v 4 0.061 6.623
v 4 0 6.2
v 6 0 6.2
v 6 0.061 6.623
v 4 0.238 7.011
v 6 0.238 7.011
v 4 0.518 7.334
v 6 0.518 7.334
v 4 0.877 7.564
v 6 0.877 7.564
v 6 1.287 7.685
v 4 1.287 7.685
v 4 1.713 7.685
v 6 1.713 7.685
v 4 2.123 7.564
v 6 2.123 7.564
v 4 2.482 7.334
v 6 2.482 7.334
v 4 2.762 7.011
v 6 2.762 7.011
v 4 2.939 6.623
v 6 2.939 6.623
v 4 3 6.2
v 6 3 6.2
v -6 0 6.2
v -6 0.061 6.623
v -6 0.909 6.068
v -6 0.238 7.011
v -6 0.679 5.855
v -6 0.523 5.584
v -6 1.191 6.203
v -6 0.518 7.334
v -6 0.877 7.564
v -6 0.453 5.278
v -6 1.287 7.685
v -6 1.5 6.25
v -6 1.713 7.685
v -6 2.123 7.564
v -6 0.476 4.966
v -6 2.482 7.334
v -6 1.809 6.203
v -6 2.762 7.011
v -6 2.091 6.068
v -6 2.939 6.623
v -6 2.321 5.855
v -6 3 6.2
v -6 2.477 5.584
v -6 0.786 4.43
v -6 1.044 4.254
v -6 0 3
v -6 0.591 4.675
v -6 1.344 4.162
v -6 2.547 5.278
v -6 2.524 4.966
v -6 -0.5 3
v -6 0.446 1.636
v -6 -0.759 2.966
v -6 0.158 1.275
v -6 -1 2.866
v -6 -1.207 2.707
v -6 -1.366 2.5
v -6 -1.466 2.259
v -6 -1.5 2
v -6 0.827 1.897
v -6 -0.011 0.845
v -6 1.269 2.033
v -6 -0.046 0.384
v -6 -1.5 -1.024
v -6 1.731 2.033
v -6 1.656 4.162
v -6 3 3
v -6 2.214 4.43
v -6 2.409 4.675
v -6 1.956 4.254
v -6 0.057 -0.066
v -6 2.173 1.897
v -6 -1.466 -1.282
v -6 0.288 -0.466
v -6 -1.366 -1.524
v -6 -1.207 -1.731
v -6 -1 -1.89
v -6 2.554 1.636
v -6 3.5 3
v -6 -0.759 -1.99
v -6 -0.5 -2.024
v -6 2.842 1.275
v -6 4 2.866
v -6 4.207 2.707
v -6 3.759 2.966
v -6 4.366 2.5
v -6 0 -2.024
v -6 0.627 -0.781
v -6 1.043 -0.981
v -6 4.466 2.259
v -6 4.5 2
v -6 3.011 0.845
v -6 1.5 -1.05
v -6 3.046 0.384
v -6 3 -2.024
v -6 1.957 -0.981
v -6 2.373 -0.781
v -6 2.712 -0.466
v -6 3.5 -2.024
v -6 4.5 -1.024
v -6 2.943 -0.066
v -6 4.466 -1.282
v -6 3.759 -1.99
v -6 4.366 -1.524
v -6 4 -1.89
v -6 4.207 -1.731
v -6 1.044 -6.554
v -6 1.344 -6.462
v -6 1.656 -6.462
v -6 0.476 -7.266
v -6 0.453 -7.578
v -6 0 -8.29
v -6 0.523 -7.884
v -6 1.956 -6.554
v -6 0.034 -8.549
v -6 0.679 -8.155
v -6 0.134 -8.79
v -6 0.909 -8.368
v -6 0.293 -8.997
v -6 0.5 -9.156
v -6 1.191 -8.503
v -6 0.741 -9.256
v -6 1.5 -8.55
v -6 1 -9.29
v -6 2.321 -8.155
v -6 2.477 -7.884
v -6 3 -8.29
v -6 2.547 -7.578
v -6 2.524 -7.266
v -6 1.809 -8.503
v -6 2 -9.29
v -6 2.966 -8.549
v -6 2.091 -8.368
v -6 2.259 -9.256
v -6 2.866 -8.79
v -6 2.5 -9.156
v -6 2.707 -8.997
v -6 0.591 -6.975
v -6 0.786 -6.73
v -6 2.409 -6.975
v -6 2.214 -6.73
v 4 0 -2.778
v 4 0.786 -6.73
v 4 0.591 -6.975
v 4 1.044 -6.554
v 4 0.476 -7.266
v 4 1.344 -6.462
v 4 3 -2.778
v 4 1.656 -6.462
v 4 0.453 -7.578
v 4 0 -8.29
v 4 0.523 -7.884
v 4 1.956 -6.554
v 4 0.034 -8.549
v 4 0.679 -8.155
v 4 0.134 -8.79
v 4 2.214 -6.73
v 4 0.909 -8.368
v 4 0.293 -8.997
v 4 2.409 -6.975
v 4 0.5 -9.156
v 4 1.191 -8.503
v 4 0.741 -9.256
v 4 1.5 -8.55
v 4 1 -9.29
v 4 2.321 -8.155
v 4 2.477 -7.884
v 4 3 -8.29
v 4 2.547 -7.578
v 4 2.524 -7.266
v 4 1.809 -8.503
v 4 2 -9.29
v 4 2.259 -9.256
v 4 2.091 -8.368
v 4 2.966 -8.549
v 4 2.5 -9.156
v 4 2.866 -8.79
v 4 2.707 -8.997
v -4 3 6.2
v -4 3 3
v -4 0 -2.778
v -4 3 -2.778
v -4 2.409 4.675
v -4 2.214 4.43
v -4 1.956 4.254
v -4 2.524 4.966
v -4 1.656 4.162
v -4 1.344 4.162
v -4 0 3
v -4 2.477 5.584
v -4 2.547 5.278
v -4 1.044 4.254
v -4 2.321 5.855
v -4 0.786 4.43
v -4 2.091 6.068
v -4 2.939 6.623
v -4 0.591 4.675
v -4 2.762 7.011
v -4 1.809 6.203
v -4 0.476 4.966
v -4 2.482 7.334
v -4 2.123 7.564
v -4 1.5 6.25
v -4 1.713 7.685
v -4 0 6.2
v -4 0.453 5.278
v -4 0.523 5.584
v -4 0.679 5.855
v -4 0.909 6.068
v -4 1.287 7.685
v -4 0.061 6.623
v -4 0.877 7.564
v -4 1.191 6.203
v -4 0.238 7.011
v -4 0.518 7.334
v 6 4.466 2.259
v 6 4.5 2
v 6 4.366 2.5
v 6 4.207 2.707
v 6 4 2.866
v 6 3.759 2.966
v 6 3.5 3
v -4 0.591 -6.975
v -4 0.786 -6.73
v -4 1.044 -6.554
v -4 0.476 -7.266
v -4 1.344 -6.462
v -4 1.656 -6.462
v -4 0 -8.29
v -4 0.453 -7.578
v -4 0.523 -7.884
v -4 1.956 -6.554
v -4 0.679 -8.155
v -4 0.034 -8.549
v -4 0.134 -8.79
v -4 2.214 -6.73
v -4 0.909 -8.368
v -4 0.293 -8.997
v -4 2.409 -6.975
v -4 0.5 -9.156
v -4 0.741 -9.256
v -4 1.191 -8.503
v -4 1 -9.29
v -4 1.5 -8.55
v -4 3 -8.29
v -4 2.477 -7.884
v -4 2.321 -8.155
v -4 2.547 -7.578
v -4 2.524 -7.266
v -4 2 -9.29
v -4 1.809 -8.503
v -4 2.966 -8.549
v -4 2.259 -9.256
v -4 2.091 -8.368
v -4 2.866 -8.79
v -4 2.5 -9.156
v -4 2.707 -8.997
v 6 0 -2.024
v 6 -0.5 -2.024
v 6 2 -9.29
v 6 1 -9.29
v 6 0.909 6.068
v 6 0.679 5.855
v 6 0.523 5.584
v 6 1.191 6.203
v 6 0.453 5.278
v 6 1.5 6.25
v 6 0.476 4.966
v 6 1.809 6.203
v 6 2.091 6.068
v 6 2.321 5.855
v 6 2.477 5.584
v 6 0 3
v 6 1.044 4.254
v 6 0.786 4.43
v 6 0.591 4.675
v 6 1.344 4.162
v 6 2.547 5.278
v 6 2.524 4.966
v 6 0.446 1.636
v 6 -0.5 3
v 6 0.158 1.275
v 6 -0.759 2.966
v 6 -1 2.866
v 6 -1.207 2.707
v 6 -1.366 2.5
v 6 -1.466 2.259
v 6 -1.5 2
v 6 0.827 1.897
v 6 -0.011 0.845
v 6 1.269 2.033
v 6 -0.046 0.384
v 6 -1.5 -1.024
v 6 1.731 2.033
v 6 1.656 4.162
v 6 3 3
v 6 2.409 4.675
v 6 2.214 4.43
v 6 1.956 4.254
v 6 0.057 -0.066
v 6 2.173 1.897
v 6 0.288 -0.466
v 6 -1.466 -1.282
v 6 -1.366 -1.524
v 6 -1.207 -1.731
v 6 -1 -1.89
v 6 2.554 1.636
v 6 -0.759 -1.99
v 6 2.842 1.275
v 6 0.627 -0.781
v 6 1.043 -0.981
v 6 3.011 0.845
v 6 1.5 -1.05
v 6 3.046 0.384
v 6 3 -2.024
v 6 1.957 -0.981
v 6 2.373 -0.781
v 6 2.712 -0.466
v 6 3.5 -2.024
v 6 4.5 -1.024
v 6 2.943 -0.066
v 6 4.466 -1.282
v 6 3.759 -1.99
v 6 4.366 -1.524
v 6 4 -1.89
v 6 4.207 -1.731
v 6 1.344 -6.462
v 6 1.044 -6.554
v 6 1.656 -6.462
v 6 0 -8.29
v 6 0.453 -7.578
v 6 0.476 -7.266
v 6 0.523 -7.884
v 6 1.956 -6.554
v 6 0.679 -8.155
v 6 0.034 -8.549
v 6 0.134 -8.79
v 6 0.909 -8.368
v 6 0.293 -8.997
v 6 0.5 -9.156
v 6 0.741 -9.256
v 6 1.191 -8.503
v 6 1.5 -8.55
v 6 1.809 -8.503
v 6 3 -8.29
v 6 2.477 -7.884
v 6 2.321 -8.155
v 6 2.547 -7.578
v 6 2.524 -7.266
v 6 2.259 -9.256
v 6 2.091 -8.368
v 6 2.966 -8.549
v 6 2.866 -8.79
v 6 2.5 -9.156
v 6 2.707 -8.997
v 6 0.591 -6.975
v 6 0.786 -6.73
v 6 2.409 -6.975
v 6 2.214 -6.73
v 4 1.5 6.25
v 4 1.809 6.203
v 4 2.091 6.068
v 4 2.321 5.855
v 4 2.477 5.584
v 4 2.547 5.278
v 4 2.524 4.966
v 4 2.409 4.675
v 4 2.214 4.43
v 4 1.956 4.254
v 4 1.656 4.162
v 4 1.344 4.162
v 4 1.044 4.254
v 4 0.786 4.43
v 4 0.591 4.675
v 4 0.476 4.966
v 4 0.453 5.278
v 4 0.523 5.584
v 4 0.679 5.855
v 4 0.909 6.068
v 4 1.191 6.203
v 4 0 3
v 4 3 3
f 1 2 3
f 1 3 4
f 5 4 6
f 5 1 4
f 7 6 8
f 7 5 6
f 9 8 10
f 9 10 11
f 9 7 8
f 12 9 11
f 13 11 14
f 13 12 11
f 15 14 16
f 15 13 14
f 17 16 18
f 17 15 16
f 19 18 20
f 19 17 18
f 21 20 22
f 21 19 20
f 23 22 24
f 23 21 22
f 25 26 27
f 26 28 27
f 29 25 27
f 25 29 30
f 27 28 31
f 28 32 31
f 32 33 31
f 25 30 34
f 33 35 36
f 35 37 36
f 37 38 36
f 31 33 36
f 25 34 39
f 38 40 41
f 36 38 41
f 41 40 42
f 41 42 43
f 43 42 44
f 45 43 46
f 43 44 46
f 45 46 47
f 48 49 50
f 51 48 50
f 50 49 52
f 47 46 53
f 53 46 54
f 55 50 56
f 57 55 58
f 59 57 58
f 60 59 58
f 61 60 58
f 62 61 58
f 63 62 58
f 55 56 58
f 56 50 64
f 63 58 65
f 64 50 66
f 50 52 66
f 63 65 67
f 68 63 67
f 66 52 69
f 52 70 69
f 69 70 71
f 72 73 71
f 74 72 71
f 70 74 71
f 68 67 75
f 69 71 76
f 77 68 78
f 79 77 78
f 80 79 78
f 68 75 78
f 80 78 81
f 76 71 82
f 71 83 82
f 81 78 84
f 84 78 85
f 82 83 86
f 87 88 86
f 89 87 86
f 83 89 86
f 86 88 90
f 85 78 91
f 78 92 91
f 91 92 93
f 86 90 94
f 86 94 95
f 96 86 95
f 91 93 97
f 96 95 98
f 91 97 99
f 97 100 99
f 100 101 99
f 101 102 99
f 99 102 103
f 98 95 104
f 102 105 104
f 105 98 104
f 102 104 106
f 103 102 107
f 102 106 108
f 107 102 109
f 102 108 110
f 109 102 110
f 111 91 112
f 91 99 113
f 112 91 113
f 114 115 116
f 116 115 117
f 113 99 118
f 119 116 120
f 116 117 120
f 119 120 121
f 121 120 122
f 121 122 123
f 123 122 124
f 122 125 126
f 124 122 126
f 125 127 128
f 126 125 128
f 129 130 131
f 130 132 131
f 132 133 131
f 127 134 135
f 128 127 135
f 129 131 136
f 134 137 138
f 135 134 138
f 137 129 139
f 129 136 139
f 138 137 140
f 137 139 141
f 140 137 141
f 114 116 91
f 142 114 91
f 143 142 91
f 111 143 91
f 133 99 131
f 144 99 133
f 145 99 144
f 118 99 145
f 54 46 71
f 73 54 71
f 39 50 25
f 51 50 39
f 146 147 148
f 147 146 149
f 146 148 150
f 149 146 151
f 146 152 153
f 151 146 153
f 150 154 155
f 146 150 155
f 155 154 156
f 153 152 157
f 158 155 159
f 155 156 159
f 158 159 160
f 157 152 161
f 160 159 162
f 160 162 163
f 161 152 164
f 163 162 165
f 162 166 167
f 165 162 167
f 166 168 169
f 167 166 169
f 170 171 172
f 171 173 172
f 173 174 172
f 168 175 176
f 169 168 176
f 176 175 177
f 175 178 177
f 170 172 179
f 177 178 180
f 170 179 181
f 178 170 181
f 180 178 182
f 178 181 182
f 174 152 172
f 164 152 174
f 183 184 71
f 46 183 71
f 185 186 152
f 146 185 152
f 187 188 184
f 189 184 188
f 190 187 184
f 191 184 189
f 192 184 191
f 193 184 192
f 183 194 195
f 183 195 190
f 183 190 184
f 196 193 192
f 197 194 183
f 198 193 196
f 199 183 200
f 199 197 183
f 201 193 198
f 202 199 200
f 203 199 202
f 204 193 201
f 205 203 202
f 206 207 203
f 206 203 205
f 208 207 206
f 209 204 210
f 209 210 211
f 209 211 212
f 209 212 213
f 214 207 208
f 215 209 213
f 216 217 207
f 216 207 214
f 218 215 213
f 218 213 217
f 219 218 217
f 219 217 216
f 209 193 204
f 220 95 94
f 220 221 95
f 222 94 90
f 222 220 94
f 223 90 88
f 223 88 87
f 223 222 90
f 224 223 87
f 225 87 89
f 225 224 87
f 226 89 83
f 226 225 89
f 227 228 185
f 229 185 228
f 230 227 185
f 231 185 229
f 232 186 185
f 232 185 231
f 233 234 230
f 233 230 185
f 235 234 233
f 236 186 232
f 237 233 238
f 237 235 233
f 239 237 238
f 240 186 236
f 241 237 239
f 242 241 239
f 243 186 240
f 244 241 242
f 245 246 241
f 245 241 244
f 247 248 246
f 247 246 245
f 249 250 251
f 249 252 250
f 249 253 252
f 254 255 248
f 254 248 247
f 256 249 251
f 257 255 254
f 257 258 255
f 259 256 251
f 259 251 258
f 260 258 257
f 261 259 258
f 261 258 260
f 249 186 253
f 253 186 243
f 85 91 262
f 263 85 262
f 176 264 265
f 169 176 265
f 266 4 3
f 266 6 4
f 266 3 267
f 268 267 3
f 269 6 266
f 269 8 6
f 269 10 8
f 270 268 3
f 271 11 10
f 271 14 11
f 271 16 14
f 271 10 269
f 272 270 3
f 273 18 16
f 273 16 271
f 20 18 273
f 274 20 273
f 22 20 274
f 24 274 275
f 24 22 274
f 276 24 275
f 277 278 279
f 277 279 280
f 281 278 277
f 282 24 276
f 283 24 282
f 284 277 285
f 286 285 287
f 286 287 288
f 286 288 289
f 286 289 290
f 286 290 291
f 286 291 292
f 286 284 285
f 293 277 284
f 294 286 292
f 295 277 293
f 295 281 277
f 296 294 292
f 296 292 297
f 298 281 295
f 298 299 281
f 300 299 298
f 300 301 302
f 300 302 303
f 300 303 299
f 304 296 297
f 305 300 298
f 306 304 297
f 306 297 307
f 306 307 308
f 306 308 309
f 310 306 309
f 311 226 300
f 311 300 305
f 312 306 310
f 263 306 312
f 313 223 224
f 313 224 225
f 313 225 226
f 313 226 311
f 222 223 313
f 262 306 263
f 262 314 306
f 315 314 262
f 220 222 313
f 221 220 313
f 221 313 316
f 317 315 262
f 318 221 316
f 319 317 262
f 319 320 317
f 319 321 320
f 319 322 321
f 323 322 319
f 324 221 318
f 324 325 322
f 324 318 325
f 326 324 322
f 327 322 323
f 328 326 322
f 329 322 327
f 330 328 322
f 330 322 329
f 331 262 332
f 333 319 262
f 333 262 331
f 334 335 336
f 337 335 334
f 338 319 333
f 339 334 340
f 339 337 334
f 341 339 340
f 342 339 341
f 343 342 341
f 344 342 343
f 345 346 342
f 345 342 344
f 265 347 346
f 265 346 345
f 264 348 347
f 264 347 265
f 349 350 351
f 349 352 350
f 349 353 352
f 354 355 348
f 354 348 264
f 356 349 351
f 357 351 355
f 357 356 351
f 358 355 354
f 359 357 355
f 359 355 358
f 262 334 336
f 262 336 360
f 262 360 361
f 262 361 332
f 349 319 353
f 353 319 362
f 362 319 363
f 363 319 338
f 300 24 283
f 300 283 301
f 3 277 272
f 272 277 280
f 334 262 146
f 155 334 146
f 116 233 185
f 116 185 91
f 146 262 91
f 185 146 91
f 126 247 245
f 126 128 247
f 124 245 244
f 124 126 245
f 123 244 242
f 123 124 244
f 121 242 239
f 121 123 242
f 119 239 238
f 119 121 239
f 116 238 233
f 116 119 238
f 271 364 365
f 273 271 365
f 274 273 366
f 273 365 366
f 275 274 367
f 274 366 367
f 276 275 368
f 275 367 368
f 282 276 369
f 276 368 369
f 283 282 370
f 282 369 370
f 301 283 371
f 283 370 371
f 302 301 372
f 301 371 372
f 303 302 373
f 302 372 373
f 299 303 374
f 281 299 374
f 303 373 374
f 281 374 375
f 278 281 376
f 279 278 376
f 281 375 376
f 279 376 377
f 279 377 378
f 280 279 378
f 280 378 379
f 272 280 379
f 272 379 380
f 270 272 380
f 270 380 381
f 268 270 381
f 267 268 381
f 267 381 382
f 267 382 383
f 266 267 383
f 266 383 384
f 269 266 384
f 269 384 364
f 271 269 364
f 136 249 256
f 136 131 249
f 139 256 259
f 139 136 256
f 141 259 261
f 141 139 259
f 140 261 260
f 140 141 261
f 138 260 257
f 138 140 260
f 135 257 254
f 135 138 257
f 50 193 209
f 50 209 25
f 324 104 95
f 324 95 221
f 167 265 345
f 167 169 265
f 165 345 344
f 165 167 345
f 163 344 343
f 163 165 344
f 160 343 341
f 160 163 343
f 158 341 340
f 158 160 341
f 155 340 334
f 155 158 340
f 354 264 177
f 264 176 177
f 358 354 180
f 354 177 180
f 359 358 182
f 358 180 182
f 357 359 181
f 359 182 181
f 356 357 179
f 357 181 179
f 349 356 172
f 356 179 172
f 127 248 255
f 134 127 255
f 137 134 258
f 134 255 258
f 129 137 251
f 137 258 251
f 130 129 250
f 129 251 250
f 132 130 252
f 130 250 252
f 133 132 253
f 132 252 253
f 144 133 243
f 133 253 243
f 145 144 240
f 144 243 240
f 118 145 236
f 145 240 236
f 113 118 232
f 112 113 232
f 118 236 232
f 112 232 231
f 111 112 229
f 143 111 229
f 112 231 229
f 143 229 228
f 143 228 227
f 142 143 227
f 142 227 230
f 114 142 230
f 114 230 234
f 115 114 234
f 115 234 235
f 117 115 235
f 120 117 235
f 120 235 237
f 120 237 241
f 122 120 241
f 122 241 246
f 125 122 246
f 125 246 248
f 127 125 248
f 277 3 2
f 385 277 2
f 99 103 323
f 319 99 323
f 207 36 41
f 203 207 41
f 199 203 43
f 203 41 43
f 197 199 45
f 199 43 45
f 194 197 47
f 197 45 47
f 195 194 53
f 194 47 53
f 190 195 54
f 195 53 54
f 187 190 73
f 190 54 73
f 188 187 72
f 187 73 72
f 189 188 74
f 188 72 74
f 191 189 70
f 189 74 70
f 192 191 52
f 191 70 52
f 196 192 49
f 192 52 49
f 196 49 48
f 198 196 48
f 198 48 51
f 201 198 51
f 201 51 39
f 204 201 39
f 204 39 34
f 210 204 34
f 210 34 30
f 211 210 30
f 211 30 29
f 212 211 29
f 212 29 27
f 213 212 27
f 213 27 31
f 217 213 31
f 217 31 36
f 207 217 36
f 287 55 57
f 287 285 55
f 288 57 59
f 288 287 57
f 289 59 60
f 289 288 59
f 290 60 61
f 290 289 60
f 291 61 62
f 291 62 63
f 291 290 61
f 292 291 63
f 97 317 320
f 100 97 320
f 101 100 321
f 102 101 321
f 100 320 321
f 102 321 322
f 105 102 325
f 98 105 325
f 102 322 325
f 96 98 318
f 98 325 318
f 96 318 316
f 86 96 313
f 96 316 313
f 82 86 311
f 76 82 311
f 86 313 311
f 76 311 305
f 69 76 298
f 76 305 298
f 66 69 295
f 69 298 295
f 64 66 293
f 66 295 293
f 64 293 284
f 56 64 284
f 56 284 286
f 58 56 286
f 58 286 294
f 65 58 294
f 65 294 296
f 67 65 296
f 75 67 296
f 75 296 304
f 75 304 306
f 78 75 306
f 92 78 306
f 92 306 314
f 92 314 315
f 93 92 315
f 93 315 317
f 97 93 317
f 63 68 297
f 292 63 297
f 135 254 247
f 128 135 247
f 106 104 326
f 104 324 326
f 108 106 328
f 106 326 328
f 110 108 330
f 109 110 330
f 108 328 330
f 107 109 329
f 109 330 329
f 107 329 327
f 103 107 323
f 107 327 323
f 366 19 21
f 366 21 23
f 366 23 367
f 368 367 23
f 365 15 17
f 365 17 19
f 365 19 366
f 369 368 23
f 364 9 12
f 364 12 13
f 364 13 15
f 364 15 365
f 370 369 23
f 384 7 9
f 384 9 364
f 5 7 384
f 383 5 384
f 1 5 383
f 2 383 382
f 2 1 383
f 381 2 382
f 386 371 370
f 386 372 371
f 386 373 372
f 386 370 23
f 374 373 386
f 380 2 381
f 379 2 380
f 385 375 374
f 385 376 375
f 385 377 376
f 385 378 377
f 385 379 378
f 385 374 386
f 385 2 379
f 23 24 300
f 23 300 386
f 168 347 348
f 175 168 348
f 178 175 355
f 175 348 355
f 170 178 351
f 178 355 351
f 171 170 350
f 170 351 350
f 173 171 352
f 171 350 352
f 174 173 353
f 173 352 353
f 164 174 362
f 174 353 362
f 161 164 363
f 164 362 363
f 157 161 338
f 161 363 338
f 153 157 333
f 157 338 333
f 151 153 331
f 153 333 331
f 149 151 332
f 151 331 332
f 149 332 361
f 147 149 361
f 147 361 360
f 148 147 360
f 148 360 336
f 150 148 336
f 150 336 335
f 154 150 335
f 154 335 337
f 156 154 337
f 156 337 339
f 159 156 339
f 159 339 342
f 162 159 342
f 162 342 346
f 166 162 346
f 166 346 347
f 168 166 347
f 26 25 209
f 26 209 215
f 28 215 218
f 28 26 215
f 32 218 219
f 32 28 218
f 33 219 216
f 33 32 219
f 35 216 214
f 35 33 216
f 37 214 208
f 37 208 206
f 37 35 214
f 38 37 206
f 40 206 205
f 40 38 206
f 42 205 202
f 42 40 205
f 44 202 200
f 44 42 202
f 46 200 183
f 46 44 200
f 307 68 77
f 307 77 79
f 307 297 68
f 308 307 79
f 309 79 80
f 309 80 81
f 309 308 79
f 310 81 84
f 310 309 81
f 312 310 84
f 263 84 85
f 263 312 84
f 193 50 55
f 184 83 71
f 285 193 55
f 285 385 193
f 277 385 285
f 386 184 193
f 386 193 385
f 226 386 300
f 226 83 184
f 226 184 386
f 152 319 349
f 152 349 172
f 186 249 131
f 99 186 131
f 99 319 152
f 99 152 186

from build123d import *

# Parameters (mm, degrees)
EXTRUDE_1_DEPTH          = 3
SKETCH_2_OUTSIDE_W       = 13.724
SKETCH_2_OUTSIDE_H       = 8.024
CUT_EXTRUDE_1_DEPTH      = 12
SKETCH_3_R               = 1.05
CUT_EXTRUDE_2_DEPTH      = 12
SKETCH_4_R               = 0.95
EXTRUDE_2_DEPTH          = 4
EXTRUDE_3_DEPTH          = 8
SKETCH_6_R               = 1.05
CUT_EXTRUDE_3_DEPTH      = 12
SKETCH_8_W               = 8
SKETCH_8_H               = 7
CUT_EXTRUDE_4_DEPTH      = 8
EXTRUDE_5_DEPTH          = 2
SKETCH_12_W              = 8
SKETCH_12_H              = 3
EXTRUDE_8_DEPTH          = 4
SKETCH_14_W              = 12
SKETCH_14_H              = 3
EXTRUDE_9_DEPTH          = 5
SKETCH_16_R              = 0.6
CUT_EXTRUDE_5_DEPTH      = 4
SKETCH_15_R              = 0.85
CUT_EXTRUDE_6_DEPTH      = 4
EXTRUDE_START            = 1.5
SKETCH_18_W              = 12
SKETCH_18_H              = 5.023607379
EXTRUDE_11_DEPTH         = 6
SKETCH_19_R              = 1.55
CUT_EXTRUDE_7_DEPTH      = 19.553975315
FILLET_1_R               = 1
CUT_EXTRUDE_8_DEPTH      = 19.553975315
CUT_EXTRUDE_8_DEPTH_BACK = 19.553975315
SKETCH_11_R              = 1.05
CUT_EXTRUDE_9_DEPTH      = 19.553975315
FILLET_2_R               = 1
SKETCH_21_W              = 8
SKETCH_21_H              = 2.221688244
CUT_EXTRUDE_10_DEPTH     = 12.939765268


with BuildPart() as part:
    # 草图1 → 凸台-拉伸1 (new body)
    with BuildSketch(Plane(origin=(0, 0, 0), x_dir=(1, 0, 0), z_dir=(0, 1, 0))):
        Polygon((-6, 0), (6, 0), (6, -8.7), (4, -8.7), (4, -3), (-4, -3), (-4, -8.7), (-6, -8.7), align=None)
    extrude(amount=EXTRUDE_1_DEPTH)

    # 草图2 outside → 切除-拉伸1 (cut)
    with BuildSketch(Plane.ZY.offset(6)):
        with Locations((4.35, 1.5)):
            Rectangle(SKETCH_2_OUTSIDE_W, SKETCH_2_OUTSIDE_H)
        with BuildLine():
            Line((6.2, 3), (0, 3))
            Line((0, 3), (0, 0))
            Line((0, 0), (6.2, 0))
            ThreePointArc((6.2, 0), (7.7, 1.5), (6.2, 3))
        make_face(mode=Mode.SUBTRACT)
    extrude(amount=-CUT_EXTRUDE_1_DEPTH, mode=Mode.SUBTRACT)

    # 草图3 → 切除-拉伸2 (cut)
    with BuildSketch(Plane.ZY.offset(6)):
        with Locations((5.2, 1.5)):
            Circle(SKETCH_3_R)
    extrude(amount=-CUT_EXTRUDE_2_DEPTH, mode=Mode.SUBTRACT)

    # 草图4 → 凸台-拉伸2 (add)
    with BuildSketch(Plane(origin=(0, 0, 0), x_dir=(-1, 0, 0), z_dir=(0, 0, -1))):
        with Locations((0, 1.5)):
            Circle(SKETCH_4_R)
    extrude(amount=EXTRUDE_2_DEPTH)

    # 草图5 → 凸台-拉伸3 (add)
    with BuildSketch(Plane(origin=(0, 0, -4), x_dir=(-1, 0, 0), z_dir=(0, 0, -1))):
        Polygon((-5, 3), (-6, 3), (-6, 0), (-4, 0), (4, 0), (6, 0), (6, 3), (5, 3), align=None)
    extrude(amount=EXTRUDE_3_DEPTH)

    # 草图6 → 切除-拉伸3 (cut)
    with BuildSketch(Plane(origin=(6, 0, 0), x_dir=(0, 0, -1), z_dir=(1, 0, 0))):
        with Locations((7.5, 1.5)):
            Circle(SKETCH_6_R)
    extrude(amount=-CUT_EXTRUDE_3_DEPTH, mode=Mode.SUBTRACT)

    # 草图8 → 切除-拉伸4 (cut)
    with BuildSketch(Plane(origin=(0, 3, 0), x_dir=(1, 0, 0), z_dir=(0, 1, 0))):
        with Locations((0, 8.5)):
            Rectangle(SKETCH_8_W, SKETCH_8_H)
    extrude(amount=-CUT_EXTRUDE_4_DEPTH, mode=Mode.SUBTRACT)

    # 草图10 → 凸台-拉伸5 (add)
    with BuildSketch(Plane.ZY.offset(6)):
        with BuildLine():
            Line((-12, 3), (-12, 5.5))
            ThreePointArc((-12, 5.5), (-10, 7.5), (-8, 5.5))
            Line((-8, 5.5), (-8, 3))
            Line((-8, 3), (-12, 3))
        make_face()
    extrude_5 = extrude(amount=-EXTRUDE_5_DEPTH)

    # 镜向1: 凸台-拉伸5 across plane
    add(extrude_5.mirror(Plane(origin=(0, 0, 0), x_dir=(0, 0, 1), z_dir=(1, 0, 0))))

    # 草图12 → 凸台-拉伸8 (add)
    with BuildSketch(Plane.XY.offset(-4)):
        with Locations((0, 1.5)):
            Rectangle(SKETCH_12_W, SKETCH_12_H)
    extrude(amount=EXTRUDE_8_DEPTH)

    # 草图14 → 凸台-拉伸9 (add)
    with BuildSketch(Plane(origin=(0, 0, 0), x_dir=(-1, 0, 0), z_dir=(0, 0, -1))):
        with Locations((0, 1.5)):
            Rectangle(SKETCH_14_W, SKETCH_14_H)
    extrude(amount=EXTRUDE_9_DEPTH)

    # 草图16 → 切除-拉伸5 (cut)
    with BuildSketch(Plane.ZY.offset(6)):
        with Locations((1.2, 1.5)):
            Circle(SKETCH_16_R)
    extrude(amount=-CUT_EXTRUDE_5_DEPTH, mode=Mode.SUBTRACT)

    # 草图15 → 切除-拉伸6 (cut)
    with BuildSketch(Plane(origin=(6, 0, 0), x_dir=(0, 0, -1), z_dir=(1, 0, 0))):
        with Locations((-1.2, 1.5)):
            Circle(SKETCH_15_R)
    extrude(amount=-CUT_EXTRUDE_6_DEPTH, mode=Mode.SUBTRACT)

    # 草图18 → 凸台-拉伸11 (add)
    with BuildSketch(Plane(origin=(0, 3, 0), x_dir=(1, 0, 0), z_dir=(0, 1, 0)).offset(EXTRUDE_START)):
        with Locations((0, -0.488196311)):
            Rectangle(SKETCH_18_W, SKETCH_18_H)
    extrude(amount=-EXTRUDE_11_DEPTH)

    # 草图19 → 切除-拉伸7 (cut, through all)
    with BuildSketch(Plane(origin=(6, 0, 0), x_dir=(0, 0, -1), z_dir=(1, 0, 0))):
        with Locations((-0.5, 1.5)):
            Circle(SKETCH_19_R)
    extrude(amount=-CUT_EXTRUDE_7_DEPTH, mode=Mode.SUBTRACT)

    # 圆角1
    fillet_1_edges = [part.edges().sort_by_distance(p)[0] for p in [
        (0, -1.5, -2.023607379),
        (0, -1.5, 3),
        (0, 4.5, 3),
        (0, 4.5, -2.023607379),
    ]]
    fillet(fillet_1_edges, radius=FILLET_1_R)

    # 草图11 → 切除-拉伸8 (cut, two sides: drawn at the far end of the back side and taken through both)
    with BuildSketch(Plane.ZY.offset(6).offset(-CUT_EXTRUDE_8_DEPTH_BACK)):
        with Locations((-10, 5.5)):
            Circle(SKETCH_11_R)
    extrude(amount=CUT_EXTRUDE_8_DEPTH + CUT_EXTRUDE_8_DEPTH_BACK, mode=Mode.SUBTRACT)

    # 草图20 → 切除-拉伸9 (cut, through all)
    with BuildSketch(Plane(origin=(6, 0, 0), x_dir=(0, 0, -1), z_dir=(1, 0, 0))):
        Polygon((8, 3), (9.290209613, 3), (9.290209613, 0), (12, 0), (12, 7.886253168), (8, 7.886253168), align=None)
    extrude(amount=-CUT_EXTRUDE_9_DEPTH, mode=Mode.SUBTRACT)

    # 圆角2
    fillet_2_edges = [part.edges().sort_by_distance(p)[0] for p in [
        (5, 0, -9.290209613),
        (-5, 0, -9.290209613),
        (5, 3, -9.290209613),
        (-5, 3, -9.290209613),
    ]]
    fillet(fillet_2_edges, radius=FILLET_2_R)

    # 草图21 → 切除-拉伸10 (cut, through all)
    with BuildSketch(Plane(origin=(0, 3, 0), x_dir=(1, 0, 0), z_dir=(0, 1, 0))):
        with Locations((0, 3.889155878)):
            Rectangle(SKETCH_21_W, SKETCH_21_H)
    extrude(amount=-CUT_EXTRUDE_10_DEPTH, mode=Mode.SUBTRACT)


solid = part.part
